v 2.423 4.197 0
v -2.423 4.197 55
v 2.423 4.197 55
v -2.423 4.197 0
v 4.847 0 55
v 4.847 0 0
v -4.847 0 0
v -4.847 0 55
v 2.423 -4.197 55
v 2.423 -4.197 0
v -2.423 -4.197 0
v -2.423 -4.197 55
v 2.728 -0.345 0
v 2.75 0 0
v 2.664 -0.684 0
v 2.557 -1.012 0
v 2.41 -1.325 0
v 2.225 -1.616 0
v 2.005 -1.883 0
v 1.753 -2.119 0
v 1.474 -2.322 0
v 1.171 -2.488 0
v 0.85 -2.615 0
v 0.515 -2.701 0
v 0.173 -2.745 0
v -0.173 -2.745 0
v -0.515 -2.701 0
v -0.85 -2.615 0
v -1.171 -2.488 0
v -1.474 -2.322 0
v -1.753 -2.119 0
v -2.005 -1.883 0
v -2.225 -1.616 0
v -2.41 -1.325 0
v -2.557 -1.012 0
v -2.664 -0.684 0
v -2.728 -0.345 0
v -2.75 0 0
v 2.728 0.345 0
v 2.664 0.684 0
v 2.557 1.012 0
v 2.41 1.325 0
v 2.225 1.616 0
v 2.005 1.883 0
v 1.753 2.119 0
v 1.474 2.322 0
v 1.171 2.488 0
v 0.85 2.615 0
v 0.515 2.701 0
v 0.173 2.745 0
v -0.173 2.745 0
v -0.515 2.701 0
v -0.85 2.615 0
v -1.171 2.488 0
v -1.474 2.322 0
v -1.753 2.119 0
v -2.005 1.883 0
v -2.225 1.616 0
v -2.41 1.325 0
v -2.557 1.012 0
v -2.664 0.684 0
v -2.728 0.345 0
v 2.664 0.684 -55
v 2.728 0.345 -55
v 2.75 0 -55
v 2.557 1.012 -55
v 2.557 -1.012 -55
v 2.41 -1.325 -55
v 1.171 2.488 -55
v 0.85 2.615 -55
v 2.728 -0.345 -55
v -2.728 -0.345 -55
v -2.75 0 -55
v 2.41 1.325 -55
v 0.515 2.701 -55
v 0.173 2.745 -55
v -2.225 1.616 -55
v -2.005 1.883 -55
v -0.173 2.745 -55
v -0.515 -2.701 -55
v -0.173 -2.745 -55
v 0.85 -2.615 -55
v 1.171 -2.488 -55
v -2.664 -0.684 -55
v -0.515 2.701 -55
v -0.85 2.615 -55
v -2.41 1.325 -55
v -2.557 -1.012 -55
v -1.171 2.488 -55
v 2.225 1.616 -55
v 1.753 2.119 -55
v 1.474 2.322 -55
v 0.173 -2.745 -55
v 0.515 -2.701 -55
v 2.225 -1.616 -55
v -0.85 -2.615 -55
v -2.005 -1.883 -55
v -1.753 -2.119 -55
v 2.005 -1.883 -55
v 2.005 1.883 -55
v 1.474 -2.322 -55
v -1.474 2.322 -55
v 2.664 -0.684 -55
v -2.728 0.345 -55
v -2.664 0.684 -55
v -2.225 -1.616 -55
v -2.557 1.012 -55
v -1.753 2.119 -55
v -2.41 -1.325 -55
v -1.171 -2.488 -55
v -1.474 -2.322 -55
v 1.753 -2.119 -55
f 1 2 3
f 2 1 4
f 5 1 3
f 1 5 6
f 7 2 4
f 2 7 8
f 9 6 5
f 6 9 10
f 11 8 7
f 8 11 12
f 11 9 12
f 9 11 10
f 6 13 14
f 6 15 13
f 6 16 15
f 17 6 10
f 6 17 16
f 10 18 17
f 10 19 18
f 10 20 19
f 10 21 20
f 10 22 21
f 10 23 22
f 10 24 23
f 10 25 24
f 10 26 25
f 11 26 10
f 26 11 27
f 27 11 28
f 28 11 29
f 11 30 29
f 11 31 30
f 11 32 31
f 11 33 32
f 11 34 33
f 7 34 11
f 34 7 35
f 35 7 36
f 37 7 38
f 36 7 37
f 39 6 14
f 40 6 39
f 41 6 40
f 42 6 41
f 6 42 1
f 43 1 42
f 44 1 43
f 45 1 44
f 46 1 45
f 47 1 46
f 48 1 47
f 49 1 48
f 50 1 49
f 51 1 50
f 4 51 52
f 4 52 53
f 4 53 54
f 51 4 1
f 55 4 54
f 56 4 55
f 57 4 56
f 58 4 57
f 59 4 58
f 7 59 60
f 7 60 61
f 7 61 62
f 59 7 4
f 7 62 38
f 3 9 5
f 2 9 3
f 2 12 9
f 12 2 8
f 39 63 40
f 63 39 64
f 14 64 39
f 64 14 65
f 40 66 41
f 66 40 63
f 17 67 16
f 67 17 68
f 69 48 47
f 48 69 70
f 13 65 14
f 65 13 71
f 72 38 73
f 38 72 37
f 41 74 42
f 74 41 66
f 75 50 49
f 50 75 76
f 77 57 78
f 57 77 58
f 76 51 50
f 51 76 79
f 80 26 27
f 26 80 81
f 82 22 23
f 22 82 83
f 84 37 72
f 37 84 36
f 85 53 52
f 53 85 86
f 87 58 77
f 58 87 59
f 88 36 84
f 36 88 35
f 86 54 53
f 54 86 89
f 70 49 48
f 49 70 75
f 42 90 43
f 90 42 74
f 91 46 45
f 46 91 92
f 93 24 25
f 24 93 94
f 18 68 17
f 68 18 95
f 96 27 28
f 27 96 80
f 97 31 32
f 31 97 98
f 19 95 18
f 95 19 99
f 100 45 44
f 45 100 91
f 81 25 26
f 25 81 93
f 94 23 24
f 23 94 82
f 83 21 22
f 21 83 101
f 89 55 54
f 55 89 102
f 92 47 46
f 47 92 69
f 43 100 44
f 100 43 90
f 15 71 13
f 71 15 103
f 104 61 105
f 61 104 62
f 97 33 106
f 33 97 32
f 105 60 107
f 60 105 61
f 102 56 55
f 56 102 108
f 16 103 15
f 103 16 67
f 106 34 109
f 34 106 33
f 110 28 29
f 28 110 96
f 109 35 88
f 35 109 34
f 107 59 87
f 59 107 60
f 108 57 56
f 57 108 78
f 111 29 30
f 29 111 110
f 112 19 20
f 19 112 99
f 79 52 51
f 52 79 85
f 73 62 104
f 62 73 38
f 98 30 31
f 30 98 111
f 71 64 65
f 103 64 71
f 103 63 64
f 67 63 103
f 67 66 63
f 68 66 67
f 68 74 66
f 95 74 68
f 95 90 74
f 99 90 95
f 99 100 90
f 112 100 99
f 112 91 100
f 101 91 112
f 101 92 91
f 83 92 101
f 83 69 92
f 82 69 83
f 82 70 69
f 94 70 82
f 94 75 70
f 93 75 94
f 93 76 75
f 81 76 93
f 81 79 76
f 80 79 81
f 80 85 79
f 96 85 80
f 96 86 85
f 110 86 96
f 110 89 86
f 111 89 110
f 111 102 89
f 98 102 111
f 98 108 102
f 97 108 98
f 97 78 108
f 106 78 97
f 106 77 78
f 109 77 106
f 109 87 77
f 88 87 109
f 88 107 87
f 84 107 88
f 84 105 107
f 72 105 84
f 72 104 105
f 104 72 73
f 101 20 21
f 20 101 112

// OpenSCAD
$fn = 50;


difference() {
	union() {
		linear_extrude(height = 55) {
			polygon(points = [[4.8468000000, 0.0000000000], [2.4234000000, 4.1974519271], [-2.4234000000, 4.1974519271], [-4.8468000000, 0.0000000000], [-2.4234000000, -4.1974519271], [2.4234000000, -4.1974519271]]);
		}
		translate(v = [0, 0, -55]) {
			cylinder(h = 55, r = 2.7500000000);
		}
	}
	union();
}
